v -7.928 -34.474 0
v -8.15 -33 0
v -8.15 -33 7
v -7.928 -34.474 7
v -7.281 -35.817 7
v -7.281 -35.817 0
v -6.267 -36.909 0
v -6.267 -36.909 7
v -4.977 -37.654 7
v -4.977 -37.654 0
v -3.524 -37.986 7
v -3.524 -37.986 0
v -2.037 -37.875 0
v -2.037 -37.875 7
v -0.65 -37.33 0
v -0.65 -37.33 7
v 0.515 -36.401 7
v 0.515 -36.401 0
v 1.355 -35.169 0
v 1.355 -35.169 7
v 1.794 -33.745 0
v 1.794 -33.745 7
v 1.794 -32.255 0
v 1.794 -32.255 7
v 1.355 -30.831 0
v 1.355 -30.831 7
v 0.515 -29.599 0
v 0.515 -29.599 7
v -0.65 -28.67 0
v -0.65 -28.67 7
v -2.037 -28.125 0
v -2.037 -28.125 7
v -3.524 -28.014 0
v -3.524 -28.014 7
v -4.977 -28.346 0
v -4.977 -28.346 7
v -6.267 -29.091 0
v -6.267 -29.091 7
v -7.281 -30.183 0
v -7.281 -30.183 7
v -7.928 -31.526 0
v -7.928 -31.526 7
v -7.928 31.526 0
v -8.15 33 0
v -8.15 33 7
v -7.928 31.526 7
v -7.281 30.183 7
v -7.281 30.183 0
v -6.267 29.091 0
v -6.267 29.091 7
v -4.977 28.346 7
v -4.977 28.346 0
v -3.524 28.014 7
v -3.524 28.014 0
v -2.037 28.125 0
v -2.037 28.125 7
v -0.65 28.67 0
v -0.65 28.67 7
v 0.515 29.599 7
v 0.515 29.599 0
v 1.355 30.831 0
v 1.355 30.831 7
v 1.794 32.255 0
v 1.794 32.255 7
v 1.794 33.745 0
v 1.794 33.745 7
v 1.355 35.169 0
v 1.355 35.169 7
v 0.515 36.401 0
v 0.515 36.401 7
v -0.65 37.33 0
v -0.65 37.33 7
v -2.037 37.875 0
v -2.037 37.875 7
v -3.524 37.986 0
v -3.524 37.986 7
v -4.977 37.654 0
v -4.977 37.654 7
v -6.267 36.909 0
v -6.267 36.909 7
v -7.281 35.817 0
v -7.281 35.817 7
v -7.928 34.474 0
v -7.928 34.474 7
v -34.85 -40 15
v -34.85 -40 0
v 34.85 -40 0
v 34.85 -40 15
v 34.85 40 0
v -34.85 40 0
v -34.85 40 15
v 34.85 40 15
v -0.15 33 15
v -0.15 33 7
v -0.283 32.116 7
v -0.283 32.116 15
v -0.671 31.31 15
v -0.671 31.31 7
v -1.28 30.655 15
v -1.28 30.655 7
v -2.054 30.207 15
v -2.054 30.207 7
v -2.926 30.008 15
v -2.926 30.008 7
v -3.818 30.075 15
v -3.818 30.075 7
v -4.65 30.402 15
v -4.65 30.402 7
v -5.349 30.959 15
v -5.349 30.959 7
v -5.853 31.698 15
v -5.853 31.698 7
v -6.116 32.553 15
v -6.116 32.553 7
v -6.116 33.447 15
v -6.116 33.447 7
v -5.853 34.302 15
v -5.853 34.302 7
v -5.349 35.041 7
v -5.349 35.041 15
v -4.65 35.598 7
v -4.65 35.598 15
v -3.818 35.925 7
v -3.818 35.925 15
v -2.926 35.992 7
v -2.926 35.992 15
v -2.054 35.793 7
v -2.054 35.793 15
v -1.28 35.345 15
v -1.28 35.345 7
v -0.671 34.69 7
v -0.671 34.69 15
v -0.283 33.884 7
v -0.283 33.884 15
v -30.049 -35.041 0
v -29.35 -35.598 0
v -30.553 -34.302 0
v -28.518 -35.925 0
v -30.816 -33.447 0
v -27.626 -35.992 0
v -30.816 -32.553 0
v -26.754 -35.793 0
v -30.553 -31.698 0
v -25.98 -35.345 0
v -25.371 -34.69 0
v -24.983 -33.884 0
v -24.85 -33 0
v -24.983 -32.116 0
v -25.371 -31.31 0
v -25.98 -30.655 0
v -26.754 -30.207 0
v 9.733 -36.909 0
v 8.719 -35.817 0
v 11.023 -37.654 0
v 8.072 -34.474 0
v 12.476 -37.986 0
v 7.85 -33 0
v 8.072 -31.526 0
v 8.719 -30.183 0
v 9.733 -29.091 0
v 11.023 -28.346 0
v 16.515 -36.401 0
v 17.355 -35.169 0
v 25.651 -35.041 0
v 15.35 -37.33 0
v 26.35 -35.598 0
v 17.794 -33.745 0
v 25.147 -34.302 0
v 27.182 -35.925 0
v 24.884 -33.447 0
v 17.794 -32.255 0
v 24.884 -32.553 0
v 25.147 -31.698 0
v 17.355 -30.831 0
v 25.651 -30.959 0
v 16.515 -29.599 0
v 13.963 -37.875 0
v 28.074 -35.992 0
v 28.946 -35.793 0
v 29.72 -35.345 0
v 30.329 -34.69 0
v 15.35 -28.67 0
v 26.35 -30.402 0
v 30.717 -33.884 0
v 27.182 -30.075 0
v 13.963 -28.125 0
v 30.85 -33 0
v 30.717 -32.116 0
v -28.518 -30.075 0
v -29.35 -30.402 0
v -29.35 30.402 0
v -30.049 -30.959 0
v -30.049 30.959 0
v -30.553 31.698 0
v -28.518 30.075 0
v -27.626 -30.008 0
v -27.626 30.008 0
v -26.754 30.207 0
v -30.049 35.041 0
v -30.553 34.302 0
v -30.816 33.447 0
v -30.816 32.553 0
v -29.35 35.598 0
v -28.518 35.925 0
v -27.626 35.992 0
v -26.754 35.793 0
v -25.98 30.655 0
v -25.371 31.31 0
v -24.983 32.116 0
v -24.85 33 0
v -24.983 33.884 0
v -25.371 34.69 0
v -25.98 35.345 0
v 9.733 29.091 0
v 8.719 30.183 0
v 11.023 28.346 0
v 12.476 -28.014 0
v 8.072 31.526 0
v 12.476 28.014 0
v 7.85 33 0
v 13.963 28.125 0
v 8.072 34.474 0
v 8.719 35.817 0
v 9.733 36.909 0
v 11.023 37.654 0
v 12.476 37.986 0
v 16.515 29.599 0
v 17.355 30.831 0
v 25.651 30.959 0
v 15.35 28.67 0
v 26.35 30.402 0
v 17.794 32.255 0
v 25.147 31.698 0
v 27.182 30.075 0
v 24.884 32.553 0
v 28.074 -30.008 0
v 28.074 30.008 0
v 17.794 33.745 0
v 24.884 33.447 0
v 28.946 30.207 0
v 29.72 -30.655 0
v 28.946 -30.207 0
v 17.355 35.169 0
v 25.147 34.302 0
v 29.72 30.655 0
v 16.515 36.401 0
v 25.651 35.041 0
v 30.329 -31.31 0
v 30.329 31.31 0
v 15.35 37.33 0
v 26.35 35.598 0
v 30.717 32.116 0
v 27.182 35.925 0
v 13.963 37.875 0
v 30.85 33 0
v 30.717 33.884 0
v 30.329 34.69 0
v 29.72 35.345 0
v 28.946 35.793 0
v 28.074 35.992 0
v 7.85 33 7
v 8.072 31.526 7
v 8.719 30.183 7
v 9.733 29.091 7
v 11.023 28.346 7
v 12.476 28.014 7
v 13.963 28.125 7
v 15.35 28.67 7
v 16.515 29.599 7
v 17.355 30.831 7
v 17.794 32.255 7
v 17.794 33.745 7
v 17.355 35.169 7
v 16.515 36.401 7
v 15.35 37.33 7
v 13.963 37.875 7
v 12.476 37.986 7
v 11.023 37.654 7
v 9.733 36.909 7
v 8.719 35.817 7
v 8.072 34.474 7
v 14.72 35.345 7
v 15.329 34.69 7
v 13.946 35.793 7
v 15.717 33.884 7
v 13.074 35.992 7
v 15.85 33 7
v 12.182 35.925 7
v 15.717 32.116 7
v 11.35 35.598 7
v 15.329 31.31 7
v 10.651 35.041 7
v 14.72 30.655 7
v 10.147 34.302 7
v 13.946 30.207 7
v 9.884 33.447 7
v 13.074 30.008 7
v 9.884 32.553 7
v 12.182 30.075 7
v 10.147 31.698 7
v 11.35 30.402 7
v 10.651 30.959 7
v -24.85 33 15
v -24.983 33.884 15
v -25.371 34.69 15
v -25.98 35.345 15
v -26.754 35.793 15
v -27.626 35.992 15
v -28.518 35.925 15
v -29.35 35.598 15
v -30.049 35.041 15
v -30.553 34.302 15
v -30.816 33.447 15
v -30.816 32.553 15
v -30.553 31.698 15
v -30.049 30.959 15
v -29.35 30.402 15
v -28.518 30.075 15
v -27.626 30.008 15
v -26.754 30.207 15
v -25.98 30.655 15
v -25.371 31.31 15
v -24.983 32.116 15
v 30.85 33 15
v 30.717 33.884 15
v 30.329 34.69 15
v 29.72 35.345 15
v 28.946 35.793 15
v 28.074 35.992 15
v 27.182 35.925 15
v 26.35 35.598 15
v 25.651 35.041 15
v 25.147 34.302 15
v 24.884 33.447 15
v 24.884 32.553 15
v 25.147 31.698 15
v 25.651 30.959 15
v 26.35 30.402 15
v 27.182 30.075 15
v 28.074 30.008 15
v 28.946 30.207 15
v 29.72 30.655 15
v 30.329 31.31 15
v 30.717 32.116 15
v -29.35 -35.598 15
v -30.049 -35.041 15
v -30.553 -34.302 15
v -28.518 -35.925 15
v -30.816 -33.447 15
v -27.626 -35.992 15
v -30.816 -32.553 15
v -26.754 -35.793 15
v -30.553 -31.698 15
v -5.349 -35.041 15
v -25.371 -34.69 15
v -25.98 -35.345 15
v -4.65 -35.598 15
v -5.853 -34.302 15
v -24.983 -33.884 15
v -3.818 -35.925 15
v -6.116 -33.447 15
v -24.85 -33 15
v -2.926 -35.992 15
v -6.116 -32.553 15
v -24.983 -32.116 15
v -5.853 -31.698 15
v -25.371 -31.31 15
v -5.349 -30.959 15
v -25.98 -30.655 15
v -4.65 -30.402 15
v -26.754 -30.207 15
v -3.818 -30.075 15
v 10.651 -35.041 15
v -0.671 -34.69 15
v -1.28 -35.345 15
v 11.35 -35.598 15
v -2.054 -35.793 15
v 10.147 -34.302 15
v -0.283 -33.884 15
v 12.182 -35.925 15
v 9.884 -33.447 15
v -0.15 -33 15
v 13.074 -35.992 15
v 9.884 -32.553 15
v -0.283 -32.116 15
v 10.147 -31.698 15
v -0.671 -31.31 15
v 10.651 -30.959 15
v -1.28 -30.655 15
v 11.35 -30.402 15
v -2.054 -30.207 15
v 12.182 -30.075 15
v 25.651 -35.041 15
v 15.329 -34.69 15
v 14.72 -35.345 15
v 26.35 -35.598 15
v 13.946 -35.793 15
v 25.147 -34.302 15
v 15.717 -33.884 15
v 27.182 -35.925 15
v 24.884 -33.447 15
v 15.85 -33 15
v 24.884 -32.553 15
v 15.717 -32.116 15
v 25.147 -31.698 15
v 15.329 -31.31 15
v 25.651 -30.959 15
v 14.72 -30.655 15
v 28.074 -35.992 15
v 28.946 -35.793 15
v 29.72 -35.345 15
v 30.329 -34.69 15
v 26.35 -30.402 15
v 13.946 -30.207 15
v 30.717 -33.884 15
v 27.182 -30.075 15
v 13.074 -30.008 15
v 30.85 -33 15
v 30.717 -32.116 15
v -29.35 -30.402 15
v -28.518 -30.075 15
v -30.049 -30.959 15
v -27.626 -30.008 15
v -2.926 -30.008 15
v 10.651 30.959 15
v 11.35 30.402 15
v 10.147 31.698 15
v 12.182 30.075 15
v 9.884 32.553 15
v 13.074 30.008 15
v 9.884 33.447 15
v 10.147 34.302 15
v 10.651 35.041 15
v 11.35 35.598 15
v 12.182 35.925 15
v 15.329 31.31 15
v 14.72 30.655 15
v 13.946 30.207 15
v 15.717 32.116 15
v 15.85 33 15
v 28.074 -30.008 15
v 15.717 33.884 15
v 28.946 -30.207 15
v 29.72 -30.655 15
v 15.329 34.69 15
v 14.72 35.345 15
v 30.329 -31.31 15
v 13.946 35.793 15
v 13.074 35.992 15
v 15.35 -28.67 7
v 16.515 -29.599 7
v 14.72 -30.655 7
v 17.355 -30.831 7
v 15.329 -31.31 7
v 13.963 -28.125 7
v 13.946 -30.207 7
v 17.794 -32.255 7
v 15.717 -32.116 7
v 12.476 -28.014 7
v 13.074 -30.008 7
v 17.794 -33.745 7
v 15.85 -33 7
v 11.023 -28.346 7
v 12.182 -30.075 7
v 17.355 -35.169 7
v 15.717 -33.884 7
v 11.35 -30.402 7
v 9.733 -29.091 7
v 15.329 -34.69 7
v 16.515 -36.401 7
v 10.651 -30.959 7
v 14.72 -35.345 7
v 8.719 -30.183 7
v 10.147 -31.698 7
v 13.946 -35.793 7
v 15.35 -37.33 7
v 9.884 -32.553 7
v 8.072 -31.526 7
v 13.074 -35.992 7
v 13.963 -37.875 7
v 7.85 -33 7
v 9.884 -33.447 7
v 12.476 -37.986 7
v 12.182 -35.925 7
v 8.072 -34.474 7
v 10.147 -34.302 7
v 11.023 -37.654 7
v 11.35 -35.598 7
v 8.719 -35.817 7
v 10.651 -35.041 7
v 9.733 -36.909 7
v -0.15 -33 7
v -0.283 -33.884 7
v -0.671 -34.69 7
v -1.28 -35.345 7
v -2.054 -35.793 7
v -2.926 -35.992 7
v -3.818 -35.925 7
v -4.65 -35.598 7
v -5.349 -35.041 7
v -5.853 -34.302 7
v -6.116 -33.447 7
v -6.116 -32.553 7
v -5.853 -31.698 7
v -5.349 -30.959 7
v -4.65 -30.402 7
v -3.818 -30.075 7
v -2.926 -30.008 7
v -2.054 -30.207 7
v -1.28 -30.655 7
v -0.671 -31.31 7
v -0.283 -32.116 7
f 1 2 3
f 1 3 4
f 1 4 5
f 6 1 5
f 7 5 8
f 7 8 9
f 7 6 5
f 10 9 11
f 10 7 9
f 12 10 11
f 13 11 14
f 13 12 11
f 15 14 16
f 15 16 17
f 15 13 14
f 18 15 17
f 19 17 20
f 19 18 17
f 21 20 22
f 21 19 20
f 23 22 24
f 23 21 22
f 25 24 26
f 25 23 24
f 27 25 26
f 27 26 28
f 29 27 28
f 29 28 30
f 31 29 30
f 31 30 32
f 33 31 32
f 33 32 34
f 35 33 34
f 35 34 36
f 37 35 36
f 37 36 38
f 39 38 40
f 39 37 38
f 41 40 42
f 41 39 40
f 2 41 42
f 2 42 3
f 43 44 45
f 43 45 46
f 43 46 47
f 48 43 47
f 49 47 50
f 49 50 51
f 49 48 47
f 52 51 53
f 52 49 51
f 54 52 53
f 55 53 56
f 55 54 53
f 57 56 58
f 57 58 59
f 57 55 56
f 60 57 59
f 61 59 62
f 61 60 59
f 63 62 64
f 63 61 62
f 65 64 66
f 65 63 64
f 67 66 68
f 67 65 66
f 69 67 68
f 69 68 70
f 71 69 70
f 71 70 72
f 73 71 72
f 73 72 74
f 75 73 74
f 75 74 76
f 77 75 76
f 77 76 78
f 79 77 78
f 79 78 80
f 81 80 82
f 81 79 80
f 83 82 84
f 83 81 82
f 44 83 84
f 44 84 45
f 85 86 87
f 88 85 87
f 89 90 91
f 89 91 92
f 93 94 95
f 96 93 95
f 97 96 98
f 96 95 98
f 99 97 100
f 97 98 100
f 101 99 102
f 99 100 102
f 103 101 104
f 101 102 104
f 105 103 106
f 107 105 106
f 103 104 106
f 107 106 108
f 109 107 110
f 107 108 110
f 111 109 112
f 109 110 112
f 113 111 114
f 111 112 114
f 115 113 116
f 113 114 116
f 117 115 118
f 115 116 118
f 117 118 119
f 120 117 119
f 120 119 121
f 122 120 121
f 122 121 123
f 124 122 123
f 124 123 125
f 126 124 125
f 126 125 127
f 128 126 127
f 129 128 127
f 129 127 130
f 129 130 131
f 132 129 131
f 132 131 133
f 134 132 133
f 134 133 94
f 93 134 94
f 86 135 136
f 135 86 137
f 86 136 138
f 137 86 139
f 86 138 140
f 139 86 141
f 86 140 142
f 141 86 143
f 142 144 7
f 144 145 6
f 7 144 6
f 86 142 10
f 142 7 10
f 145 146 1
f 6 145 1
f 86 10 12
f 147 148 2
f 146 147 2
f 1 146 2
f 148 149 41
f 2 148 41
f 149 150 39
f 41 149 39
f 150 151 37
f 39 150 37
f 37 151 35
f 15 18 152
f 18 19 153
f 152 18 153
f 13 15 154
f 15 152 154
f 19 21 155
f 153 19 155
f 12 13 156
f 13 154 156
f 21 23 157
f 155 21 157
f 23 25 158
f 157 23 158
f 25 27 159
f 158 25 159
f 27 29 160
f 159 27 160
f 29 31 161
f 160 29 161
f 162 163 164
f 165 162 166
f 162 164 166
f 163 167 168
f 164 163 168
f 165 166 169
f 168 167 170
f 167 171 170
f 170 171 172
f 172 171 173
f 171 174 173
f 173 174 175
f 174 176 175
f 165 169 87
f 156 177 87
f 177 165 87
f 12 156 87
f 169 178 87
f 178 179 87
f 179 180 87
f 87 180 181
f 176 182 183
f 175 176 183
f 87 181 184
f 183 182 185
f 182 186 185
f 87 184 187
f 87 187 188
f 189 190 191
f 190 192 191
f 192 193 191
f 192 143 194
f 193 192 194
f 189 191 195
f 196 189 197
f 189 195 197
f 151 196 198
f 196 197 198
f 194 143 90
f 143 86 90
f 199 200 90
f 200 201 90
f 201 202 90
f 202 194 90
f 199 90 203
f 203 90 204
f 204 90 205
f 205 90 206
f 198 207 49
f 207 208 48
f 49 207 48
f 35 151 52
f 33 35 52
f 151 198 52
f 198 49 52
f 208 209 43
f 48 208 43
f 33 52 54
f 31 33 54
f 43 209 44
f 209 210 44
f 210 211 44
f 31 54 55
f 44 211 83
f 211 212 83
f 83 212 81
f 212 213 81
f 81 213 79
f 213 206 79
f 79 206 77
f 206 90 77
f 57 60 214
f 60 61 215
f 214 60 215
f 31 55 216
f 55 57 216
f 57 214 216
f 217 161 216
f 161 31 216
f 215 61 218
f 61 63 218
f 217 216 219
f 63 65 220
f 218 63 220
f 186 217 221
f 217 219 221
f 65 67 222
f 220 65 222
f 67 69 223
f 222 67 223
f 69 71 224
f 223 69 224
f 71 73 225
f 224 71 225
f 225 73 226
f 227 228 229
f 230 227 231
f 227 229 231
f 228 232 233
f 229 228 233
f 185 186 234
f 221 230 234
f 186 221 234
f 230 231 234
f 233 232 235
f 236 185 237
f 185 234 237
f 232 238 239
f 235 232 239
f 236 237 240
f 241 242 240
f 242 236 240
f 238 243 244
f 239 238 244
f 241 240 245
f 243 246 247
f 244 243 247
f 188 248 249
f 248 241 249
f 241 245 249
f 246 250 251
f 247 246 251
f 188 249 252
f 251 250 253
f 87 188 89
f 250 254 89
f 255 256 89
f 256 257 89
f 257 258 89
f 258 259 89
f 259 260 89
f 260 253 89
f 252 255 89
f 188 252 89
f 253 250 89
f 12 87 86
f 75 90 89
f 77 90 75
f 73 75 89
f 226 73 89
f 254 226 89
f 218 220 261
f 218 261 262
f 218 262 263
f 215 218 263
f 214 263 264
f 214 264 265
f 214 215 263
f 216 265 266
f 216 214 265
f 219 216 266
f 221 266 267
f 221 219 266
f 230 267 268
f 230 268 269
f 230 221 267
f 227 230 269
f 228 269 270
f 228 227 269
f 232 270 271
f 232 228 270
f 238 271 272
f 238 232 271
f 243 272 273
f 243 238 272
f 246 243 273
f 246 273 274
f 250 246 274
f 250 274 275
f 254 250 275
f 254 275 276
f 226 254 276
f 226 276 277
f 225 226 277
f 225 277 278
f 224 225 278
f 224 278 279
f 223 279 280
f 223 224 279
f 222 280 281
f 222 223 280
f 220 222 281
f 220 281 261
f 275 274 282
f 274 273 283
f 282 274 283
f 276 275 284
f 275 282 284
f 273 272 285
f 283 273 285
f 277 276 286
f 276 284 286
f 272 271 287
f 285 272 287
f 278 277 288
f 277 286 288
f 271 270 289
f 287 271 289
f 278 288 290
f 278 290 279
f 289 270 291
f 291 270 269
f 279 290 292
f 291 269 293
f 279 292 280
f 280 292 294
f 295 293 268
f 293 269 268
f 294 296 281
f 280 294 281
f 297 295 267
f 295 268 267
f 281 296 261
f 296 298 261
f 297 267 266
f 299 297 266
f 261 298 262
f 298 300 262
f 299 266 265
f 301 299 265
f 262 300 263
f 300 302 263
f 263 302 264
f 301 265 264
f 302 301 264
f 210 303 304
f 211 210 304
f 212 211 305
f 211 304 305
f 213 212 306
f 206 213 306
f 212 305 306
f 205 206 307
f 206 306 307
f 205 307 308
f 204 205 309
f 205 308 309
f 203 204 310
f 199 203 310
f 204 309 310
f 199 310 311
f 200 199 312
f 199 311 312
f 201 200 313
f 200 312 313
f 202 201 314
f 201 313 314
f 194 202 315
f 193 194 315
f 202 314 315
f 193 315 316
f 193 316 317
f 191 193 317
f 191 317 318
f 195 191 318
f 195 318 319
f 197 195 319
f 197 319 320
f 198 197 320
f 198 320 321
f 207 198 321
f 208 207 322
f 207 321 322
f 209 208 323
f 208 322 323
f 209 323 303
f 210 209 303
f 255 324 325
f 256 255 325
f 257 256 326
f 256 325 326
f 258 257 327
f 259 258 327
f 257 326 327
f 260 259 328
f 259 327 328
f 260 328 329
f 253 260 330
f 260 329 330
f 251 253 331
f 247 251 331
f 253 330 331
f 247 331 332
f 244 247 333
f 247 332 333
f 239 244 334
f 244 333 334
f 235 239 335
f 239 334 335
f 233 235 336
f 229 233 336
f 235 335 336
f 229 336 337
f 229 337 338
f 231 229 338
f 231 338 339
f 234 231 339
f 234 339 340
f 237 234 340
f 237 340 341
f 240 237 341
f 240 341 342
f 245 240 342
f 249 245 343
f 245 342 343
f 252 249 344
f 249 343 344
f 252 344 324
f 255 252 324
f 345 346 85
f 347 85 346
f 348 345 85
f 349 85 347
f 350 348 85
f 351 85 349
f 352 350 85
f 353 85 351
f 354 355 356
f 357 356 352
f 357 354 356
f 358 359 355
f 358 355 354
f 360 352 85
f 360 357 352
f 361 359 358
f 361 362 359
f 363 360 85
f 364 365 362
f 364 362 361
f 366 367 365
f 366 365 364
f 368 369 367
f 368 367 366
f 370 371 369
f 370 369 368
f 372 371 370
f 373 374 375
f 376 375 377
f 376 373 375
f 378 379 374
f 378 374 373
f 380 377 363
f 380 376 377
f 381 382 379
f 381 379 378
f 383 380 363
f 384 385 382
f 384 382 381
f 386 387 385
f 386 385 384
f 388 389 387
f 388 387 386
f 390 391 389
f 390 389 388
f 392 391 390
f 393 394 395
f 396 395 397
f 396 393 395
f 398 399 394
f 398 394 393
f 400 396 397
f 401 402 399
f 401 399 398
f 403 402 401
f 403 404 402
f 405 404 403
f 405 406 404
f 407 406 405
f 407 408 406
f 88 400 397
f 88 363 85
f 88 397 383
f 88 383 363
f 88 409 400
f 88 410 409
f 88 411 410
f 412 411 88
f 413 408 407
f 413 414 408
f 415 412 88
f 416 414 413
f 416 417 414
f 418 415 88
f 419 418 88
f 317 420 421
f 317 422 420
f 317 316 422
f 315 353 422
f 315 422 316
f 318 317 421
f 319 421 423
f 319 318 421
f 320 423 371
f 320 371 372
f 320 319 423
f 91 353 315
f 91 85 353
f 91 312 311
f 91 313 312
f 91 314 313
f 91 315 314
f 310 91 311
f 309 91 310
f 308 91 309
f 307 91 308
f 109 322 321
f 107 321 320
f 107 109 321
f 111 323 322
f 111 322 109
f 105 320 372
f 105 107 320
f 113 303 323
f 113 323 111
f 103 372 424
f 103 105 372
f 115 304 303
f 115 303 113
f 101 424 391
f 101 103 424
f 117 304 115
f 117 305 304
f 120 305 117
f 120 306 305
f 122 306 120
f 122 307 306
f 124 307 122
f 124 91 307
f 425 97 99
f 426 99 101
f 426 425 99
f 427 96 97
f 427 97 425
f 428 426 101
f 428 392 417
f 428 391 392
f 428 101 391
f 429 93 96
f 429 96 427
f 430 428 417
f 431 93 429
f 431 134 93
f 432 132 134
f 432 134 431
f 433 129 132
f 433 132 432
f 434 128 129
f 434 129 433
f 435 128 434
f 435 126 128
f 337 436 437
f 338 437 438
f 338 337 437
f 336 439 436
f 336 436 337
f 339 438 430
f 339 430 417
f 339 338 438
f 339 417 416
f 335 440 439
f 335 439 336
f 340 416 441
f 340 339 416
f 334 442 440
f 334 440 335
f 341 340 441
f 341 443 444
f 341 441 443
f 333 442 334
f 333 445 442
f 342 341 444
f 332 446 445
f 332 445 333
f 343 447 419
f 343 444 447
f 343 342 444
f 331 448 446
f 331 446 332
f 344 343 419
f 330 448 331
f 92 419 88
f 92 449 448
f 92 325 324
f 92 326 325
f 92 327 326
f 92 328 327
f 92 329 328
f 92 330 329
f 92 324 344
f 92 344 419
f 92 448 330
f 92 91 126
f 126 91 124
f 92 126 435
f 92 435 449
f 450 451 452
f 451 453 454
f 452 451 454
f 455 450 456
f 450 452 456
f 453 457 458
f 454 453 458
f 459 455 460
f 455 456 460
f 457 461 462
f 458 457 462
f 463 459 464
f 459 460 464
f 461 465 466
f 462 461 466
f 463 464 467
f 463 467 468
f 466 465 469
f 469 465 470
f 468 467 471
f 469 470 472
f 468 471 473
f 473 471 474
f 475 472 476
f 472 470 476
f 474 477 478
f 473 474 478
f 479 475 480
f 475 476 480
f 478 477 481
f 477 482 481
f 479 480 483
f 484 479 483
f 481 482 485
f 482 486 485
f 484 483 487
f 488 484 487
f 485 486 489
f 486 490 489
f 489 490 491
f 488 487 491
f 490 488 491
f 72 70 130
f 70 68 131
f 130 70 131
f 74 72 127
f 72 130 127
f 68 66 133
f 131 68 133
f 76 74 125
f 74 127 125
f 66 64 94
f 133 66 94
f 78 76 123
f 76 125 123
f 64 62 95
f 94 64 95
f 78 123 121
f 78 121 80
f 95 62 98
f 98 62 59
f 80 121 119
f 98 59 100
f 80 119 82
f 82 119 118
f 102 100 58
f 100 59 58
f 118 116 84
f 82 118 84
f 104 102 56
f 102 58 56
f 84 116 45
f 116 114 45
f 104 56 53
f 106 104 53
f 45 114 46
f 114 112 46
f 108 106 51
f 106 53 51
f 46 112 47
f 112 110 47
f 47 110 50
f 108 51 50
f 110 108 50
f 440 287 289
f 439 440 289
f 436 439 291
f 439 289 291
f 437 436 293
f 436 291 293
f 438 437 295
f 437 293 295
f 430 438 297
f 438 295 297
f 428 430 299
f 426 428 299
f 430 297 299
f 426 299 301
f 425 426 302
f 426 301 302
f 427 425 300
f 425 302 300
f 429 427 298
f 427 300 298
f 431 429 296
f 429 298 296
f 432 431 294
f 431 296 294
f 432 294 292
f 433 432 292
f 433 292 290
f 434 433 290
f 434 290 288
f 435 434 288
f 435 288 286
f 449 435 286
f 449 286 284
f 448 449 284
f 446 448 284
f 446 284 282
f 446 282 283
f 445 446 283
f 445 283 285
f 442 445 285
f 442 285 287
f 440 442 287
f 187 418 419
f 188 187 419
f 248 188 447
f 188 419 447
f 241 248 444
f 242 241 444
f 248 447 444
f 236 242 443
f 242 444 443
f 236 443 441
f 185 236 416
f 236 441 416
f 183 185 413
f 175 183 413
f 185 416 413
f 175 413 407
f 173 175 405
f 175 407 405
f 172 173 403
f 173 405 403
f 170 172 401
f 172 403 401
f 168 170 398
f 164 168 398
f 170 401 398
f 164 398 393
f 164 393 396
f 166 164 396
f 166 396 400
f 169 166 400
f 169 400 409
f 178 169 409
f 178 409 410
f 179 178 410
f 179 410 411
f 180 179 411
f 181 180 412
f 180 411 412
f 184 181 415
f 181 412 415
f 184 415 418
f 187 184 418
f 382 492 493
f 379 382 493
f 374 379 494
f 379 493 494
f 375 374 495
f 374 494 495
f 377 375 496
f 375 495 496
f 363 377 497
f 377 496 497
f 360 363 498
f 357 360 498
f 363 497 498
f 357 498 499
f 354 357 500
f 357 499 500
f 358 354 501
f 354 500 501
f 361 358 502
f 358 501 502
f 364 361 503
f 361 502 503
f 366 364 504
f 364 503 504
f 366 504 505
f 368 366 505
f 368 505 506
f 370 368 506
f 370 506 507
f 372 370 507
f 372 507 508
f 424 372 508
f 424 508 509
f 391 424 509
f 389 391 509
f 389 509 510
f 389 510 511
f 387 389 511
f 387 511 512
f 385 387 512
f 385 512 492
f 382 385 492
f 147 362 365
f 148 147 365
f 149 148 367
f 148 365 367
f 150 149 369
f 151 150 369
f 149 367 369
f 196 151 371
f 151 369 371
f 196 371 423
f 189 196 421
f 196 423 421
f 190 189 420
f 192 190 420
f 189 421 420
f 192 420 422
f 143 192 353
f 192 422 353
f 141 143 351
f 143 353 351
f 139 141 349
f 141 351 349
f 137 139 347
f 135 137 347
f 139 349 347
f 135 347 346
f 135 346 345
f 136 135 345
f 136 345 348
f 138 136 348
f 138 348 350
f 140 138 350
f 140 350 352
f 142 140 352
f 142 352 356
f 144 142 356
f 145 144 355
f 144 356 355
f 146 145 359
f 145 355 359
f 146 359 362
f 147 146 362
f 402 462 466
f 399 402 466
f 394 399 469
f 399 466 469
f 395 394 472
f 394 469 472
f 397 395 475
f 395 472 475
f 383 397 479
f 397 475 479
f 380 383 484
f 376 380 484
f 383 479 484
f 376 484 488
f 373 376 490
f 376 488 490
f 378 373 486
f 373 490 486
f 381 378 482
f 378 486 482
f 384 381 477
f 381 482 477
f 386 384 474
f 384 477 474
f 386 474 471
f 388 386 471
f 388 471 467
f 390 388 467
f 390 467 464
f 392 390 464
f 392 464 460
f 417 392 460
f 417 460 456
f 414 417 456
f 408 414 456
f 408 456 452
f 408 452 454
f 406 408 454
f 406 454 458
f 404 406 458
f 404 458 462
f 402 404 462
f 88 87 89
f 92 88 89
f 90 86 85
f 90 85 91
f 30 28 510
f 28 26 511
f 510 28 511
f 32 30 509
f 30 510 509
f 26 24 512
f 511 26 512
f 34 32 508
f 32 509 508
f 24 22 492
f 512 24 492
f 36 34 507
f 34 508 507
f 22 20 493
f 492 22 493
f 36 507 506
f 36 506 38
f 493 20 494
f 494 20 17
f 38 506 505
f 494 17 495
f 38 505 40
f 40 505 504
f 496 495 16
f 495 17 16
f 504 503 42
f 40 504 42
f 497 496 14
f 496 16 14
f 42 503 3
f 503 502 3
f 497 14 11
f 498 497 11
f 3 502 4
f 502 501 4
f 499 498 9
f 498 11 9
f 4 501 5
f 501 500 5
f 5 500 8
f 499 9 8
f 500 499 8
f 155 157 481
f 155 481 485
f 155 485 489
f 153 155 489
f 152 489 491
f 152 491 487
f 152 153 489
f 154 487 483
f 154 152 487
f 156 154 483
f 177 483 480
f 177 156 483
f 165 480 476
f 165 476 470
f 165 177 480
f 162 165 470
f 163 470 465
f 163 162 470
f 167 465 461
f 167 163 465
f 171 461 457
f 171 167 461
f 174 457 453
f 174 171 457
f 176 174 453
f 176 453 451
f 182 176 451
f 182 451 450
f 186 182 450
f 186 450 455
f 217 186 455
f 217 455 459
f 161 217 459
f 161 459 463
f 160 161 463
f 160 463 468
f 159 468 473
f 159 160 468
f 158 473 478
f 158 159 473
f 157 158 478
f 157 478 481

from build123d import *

# Parameters (mm, degrees)
SZKIC1_W                    = 69.7
SZKIC1_H                    = 80
DODANIE_WYCI_GNI_CIE1_DEPTH = 15
SZKIC3_R                    = 3
WYTNIJ_WYCI_GNI_CIE1_DEPTH  = 15
SZKIC4_R                    = 5
WYTNIJ_WYCI_GNI_CIE2_DEPTH  = 7
SZKIC5_R                    = 3
WYTNIJ_WYCI_GNI_CIE3_DEPTH  = 15


with BuildPart() as part:
    # Szkic1 → Dodanie-wyciągnięcie1 (new body)
    with BuildSketch(Plane.XY):
        Rectangle(SZKIC1_W, SZKIC1_H)
    extrude(amount=DODANIE_WYCI_GNI_CIE1_DEPTH)

    # Szkic3 → Wytnij-wyciągnięcie1 (cut)
    with BuildSketch(Plane(origin=(0, 0, 0), x_dir=(1, 0, 0), z_dir=(0, 0, -1))):
        with Locations((12.85, 33)):
            Circle(SZKIC3_R)
        with Locations((-3.15, 33)):
            Circle(SZKIC3_R)
        with Locations((-3.15, -33)):
            Circle(SZKIC3_R)
        with Locations((12.85, -33)):
            Circle(SZKIC3_R)
    extrude(amount=-WYTNIJ_WYCI_GNI_CIE1_DEPTH, mode=Mode.SUBTRACT)

    # Szkic4 → Wytnij-wyciągnięcie2 (cut)
    with BuildSketch(Plane(origin=(0, 0, 0), x_dir=(-1, 0, 0), z_dir=(0, 0, 1))):
        with Locations((3.15, 33)):
            Circle(SZKIC4_R)
        with Locations((-12.85, 33)):
            Circle(SZKIC4_R)
        with Locations((-12.85, -33)):
            Circle(SZKIC4_R)
        with Locations((3.15, -33)):
            Circle(SZKIC4_R)
    extrude(amount=WYTNIJ_WYCI_GNI_CIE2_DEPTH, mode=Mode.SUBTRACT)

    # Szkic5 → Wytnij-wyciągnięcie3 (cut)
    with BuildSketch(Plane.XY.offset(15)):
        with Locations((-27.85, 33)):
            Circle(SZKIC5_R)
        with Locations((27.85, 33)):
            Circle(SZKIC5_R)
        with Locations((27.85, -33)):
            Circle(SZKIC5_R)
        with Locations((-27.85, -33)):
            Circle(SZKIC5_R)
    extrude(amount=-WYTNIJ_WYCI_GNI_CIE3_DEPTH, mode=Mode.SUBTRACT)


solid = part.part
